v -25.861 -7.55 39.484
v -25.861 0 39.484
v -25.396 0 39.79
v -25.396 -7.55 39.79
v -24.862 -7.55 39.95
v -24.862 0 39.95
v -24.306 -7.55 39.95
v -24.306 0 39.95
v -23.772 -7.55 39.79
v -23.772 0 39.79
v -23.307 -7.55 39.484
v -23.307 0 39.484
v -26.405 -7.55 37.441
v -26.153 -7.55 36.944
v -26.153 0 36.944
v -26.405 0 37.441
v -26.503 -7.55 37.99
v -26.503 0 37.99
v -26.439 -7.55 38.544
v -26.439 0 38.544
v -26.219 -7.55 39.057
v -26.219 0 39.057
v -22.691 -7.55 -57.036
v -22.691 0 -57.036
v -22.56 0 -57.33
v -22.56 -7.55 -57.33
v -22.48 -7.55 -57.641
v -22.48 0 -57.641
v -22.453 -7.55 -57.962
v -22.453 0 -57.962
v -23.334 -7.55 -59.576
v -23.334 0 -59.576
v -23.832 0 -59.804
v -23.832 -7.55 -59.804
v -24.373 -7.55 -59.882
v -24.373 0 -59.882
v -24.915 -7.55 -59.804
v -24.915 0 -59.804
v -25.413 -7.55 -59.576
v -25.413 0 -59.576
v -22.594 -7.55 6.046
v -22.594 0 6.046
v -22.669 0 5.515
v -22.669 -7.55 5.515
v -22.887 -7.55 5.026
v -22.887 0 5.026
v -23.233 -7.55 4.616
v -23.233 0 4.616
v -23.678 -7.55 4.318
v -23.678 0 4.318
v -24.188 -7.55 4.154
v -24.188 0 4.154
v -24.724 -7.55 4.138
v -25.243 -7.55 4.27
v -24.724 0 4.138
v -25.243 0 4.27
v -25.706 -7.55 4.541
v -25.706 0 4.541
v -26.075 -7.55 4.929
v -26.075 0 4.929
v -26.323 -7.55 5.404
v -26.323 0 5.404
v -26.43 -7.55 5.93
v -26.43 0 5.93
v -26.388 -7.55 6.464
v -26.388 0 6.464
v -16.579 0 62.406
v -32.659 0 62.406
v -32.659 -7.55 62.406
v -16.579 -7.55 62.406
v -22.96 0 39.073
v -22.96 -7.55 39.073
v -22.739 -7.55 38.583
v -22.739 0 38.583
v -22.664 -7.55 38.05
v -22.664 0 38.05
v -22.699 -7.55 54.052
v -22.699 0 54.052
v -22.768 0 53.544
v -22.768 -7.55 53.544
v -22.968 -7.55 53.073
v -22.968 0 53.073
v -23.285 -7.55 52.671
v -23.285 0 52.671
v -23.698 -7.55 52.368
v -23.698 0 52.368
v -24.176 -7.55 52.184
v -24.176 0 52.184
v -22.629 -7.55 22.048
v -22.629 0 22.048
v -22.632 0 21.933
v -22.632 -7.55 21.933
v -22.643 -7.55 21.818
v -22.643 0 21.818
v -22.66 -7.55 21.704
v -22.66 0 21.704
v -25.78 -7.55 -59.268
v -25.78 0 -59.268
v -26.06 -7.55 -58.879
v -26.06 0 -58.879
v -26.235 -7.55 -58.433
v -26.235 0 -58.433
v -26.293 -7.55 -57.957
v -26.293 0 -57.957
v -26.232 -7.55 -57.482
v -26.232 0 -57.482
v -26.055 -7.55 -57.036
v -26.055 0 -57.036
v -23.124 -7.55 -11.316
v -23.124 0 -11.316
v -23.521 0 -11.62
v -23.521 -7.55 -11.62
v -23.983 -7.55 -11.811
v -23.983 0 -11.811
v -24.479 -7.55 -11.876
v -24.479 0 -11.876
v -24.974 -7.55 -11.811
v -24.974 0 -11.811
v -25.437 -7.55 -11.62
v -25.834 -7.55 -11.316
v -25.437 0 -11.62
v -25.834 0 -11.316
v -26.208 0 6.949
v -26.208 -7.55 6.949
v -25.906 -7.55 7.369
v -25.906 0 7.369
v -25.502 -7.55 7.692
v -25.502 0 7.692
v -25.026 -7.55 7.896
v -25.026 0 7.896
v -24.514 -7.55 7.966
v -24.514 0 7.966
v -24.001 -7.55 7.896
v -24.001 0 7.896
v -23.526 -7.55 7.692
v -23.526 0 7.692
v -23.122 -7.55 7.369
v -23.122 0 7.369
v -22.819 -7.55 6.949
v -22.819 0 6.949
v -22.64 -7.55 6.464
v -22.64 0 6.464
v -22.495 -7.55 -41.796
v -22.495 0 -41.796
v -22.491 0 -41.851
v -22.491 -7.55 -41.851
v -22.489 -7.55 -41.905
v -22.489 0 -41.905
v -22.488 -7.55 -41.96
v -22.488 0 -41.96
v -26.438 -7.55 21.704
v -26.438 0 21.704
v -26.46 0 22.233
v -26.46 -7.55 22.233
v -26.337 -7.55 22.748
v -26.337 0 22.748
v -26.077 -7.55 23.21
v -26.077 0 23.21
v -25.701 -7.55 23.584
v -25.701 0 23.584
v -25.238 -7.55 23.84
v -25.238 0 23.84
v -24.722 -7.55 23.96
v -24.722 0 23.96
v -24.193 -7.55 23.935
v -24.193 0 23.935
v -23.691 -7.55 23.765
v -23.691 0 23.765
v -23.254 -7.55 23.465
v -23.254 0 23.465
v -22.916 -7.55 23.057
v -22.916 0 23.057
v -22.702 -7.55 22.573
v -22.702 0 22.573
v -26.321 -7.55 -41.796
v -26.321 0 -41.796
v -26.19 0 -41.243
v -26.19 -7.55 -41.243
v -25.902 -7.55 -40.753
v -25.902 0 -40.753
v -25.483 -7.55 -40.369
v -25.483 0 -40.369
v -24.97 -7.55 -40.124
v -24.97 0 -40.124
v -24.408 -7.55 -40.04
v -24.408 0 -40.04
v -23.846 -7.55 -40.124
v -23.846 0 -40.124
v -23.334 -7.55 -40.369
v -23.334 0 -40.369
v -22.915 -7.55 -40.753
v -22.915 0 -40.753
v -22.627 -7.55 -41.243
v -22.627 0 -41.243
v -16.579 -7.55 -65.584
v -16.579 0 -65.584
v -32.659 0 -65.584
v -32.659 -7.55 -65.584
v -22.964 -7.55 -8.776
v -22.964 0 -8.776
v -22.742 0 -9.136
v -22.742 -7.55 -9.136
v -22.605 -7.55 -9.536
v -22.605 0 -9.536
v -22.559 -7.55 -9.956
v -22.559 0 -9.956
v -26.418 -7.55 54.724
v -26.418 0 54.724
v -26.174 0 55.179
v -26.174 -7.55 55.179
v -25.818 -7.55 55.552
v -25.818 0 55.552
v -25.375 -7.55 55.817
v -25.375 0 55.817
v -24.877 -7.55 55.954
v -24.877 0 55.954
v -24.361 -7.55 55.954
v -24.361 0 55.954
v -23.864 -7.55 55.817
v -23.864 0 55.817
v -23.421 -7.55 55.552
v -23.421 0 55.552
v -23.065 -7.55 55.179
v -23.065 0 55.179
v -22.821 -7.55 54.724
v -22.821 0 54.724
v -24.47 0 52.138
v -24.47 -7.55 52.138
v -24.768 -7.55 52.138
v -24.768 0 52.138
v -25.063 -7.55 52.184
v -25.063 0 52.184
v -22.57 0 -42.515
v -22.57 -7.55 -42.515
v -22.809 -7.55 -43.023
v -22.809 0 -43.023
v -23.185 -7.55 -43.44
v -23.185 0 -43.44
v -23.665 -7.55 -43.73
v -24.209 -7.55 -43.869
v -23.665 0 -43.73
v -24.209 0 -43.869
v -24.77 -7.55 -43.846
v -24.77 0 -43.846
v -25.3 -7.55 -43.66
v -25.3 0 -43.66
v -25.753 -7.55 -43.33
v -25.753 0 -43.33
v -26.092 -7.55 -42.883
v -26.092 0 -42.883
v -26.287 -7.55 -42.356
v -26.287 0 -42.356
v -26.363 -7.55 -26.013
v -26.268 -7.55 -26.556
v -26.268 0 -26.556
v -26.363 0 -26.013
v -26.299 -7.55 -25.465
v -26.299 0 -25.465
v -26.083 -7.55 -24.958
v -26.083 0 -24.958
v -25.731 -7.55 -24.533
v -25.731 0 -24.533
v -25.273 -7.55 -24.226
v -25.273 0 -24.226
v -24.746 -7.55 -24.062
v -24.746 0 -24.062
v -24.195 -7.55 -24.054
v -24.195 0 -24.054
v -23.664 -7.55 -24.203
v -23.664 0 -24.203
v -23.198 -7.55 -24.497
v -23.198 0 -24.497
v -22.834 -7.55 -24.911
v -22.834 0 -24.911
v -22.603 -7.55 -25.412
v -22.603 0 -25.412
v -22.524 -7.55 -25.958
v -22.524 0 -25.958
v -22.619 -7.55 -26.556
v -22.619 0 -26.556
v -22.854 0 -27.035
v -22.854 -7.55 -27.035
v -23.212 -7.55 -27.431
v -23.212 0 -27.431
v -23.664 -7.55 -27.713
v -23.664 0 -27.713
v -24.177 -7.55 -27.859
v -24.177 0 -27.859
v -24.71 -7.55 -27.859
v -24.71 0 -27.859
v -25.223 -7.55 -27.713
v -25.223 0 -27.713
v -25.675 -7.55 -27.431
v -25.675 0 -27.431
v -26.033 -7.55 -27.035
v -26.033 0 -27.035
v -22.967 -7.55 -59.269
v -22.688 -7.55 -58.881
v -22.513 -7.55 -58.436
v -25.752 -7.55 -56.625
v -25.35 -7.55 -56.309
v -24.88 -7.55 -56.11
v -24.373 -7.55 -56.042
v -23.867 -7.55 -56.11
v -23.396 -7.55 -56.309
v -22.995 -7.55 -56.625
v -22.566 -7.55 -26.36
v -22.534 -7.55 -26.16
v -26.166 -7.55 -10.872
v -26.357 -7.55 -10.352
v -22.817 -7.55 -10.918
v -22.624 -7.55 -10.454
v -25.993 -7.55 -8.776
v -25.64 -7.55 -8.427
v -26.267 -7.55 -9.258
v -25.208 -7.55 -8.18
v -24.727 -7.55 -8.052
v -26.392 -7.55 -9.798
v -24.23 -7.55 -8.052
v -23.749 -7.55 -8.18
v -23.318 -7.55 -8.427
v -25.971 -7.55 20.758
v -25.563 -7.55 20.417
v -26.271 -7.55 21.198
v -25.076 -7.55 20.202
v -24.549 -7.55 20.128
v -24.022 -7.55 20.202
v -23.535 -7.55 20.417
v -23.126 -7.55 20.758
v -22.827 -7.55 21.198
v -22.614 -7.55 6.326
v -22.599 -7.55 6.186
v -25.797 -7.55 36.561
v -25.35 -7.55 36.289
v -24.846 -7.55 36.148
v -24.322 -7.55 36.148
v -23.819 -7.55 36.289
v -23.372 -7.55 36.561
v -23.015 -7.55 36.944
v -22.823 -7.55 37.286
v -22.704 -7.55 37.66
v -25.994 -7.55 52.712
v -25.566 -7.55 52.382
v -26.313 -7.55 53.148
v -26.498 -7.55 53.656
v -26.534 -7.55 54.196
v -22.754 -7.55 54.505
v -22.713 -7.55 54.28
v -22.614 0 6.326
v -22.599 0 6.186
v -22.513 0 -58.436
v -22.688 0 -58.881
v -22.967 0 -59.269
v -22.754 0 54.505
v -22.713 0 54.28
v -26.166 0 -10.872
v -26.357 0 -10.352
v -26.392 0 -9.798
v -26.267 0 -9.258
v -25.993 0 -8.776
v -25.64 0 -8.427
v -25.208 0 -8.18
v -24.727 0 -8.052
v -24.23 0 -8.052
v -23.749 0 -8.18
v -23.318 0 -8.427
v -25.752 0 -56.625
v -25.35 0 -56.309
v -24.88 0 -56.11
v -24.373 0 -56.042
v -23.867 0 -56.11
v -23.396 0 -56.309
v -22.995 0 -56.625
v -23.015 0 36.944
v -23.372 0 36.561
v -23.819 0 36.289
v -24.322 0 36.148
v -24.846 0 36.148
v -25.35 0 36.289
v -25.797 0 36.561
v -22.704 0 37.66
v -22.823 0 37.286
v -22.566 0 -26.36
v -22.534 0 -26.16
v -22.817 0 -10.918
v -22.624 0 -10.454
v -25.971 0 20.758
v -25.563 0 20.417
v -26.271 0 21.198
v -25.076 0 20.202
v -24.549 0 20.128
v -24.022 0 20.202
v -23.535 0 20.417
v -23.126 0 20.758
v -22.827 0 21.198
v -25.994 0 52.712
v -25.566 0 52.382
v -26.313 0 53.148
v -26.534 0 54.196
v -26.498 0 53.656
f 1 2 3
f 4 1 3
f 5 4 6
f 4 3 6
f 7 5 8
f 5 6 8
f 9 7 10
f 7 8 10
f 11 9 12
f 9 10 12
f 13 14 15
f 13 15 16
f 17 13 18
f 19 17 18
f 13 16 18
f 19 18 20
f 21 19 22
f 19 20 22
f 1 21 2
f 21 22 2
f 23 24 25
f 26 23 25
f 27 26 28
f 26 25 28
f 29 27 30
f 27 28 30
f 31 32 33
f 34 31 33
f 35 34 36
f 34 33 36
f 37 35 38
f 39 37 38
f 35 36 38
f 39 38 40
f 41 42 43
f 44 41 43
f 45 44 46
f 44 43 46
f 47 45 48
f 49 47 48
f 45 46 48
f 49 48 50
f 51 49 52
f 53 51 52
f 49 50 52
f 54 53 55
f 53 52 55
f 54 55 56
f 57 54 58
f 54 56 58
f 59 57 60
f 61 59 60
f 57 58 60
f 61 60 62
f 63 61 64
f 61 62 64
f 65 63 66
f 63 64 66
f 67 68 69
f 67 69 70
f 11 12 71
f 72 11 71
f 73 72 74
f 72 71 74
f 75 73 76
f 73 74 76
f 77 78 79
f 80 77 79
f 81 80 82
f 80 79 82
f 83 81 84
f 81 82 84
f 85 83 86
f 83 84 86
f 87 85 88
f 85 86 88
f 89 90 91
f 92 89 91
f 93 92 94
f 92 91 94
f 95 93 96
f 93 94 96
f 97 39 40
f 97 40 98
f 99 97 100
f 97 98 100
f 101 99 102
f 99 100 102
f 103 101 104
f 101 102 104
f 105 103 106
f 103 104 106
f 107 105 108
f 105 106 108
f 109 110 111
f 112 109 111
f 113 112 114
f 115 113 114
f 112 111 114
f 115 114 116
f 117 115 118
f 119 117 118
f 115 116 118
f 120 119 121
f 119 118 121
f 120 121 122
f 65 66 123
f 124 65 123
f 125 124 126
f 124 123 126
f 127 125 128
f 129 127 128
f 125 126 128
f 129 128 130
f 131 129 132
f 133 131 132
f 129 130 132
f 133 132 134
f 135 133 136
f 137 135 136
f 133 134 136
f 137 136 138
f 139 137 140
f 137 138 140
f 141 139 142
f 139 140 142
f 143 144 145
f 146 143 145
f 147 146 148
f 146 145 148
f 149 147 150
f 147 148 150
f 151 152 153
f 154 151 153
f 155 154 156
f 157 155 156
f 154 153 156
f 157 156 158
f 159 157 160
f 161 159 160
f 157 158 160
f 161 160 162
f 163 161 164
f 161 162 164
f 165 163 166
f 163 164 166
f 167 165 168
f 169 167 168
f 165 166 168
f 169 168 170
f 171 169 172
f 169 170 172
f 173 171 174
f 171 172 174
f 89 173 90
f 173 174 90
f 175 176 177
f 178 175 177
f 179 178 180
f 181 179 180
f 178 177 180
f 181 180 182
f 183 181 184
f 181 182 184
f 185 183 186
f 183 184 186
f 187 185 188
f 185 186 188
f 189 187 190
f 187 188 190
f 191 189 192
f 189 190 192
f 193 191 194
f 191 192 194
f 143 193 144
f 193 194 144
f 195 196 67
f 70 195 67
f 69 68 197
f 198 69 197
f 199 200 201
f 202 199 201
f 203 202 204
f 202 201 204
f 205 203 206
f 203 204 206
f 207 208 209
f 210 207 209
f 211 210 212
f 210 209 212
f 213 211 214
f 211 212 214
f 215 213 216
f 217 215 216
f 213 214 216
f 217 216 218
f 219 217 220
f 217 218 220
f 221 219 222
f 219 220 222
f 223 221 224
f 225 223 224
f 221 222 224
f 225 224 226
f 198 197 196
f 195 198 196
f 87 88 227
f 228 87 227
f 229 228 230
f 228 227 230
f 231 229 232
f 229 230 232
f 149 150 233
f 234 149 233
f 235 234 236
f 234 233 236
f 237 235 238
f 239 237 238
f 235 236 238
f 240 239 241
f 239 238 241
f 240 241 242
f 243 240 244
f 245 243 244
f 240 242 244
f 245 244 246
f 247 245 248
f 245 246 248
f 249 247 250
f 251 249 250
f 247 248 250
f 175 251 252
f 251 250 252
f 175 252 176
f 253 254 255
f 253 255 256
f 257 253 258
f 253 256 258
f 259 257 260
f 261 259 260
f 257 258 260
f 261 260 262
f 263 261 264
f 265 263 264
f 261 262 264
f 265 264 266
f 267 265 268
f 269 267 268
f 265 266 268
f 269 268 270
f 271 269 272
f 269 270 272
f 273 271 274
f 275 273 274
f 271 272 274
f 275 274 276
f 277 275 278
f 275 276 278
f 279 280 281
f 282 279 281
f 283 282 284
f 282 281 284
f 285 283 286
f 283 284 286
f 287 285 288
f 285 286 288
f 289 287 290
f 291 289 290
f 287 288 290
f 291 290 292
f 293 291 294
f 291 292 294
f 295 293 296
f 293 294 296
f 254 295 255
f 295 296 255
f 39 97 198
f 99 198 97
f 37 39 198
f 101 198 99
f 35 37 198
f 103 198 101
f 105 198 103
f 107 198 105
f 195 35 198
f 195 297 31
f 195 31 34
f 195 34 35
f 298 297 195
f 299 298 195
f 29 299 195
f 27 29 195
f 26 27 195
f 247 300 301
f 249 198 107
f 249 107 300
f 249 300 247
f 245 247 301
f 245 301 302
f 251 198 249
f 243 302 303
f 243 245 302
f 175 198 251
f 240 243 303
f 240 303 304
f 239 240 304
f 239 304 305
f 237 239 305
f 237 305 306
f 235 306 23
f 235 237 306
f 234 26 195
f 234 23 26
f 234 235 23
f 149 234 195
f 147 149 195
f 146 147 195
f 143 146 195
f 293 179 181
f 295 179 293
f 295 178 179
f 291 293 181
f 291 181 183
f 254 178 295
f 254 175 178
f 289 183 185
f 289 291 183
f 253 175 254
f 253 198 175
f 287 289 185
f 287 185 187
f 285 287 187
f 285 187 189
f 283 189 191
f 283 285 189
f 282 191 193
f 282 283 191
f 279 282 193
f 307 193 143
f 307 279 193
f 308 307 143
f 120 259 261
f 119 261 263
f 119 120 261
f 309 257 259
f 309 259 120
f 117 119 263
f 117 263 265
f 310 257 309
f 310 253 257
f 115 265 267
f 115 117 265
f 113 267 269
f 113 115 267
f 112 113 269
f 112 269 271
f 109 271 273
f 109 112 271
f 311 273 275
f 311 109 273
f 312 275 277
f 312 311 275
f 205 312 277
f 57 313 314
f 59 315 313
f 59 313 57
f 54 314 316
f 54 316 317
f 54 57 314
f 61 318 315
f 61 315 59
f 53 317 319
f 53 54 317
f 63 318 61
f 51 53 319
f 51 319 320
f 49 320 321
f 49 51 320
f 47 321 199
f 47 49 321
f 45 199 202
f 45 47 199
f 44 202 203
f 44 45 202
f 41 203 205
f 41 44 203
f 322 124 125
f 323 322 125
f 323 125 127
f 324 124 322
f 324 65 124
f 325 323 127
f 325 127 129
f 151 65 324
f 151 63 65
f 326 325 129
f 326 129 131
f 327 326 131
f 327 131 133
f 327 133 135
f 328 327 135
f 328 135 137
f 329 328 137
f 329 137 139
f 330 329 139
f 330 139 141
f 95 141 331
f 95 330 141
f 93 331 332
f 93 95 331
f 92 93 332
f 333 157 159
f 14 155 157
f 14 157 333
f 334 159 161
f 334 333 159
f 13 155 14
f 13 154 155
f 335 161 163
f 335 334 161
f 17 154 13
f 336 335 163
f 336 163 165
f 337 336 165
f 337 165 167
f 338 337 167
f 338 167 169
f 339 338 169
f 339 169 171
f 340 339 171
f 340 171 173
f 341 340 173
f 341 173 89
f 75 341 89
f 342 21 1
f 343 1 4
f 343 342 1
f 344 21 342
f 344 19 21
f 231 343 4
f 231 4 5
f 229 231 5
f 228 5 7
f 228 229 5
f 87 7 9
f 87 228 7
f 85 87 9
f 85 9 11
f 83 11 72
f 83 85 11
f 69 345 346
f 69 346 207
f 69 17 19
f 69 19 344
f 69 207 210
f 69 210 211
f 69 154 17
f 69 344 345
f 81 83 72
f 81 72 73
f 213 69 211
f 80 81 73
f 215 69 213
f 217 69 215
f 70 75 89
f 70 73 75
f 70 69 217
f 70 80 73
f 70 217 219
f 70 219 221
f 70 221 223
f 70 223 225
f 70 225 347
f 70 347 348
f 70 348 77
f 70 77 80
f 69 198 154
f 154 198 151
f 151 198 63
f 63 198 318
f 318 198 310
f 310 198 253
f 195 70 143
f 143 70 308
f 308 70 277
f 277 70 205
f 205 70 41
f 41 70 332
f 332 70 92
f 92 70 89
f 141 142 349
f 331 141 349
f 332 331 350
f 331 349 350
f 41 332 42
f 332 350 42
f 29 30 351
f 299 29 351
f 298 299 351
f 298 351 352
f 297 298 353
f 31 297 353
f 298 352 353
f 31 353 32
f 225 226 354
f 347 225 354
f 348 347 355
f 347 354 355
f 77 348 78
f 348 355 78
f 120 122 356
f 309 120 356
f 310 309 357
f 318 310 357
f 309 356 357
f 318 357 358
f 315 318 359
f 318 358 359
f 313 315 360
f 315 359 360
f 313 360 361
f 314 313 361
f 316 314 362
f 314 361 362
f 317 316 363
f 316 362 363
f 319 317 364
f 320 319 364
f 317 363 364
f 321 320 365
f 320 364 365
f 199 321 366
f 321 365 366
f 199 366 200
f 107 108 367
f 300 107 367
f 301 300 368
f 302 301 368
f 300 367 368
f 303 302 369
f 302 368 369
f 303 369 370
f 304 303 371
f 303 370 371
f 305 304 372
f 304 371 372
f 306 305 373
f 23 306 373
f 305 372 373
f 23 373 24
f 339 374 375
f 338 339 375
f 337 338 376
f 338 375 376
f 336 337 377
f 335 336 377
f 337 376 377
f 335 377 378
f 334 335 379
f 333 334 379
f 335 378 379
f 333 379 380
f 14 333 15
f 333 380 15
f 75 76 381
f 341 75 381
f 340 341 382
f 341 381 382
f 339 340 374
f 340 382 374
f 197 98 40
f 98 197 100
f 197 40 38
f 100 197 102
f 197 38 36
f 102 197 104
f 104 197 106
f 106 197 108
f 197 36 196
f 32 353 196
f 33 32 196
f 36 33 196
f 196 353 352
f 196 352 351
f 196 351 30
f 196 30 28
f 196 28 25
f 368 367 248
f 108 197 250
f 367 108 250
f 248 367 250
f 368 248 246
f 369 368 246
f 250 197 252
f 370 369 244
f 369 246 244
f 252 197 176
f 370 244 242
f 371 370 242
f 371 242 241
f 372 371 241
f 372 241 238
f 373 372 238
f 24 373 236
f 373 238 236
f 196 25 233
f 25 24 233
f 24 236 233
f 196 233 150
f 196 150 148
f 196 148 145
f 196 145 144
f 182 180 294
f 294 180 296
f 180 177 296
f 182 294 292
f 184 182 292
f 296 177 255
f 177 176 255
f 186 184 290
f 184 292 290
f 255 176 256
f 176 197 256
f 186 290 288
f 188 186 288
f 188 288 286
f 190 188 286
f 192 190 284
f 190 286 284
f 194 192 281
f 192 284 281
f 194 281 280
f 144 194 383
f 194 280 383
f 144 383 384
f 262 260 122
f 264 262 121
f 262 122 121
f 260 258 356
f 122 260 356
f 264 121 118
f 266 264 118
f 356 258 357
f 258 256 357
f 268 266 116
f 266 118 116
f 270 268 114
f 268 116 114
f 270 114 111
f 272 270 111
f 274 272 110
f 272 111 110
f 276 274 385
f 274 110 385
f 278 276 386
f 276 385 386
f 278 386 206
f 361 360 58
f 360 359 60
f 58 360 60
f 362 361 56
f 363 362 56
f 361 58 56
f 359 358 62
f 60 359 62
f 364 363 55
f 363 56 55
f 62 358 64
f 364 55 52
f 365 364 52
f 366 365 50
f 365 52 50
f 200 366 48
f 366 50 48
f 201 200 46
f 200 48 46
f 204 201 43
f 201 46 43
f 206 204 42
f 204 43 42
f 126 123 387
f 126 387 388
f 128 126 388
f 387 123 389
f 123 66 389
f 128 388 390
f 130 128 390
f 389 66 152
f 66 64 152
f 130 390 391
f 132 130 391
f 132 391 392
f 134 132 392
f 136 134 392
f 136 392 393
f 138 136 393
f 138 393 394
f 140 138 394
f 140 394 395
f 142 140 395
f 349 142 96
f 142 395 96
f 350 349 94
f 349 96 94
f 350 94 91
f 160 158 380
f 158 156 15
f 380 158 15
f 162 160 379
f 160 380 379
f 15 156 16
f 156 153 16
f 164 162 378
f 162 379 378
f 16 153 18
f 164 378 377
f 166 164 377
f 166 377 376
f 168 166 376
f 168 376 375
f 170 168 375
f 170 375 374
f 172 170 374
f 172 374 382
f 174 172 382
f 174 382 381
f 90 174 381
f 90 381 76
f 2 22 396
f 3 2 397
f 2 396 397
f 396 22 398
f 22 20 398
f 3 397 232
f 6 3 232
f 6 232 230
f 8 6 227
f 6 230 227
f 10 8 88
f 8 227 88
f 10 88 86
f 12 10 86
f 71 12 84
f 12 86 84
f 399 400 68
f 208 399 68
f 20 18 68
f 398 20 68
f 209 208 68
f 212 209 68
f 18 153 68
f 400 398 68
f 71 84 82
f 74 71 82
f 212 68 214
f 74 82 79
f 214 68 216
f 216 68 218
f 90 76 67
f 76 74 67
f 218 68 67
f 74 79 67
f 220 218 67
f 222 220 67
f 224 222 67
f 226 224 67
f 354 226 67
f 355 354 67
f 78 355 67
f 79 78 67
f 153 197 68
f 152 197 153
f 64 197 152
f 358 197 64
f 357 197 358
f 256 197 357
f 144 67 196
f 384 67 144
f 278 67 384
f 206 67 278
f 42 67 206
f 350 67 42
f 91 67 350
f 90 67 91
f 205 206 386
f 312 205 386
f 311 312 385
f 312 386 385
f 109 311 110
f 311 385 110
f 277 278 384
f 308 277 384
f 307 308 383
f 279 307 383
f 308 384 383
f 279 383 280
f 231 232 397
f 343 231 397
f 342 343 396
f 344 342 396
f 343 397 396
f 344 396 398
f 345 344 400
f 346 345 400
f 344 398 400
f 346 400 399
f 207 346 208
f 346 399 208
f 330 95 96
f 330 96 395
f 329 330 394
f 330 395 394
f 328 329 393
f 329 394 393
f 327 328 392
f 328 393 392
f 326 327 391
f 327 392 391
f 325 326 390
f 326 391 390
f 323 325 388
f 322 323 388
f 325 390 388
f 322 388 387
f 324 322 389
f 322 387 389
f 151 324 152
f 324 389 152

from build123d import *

# Parameters (mm, degrees)
F0_W     = 16.08
F0_H     = 2.6018508029
F1_DEPTH = 7.55


# Not quite as in the source:
# - the program builds the solid bodies; features that only make, move or delete a surface that nothing else refers to are left out


with BuildPart() as f1:
    # F0 (on Front) → F1 (new body)
    with BuildSketch(Plane.XZ):
        with Locations((-24.6192478486, 61.1047763503)):
            Rectangle(F0_W, F0_H)
        with BuildLine():
            Line((-16.5792478486, 59.8038509488), (-32.6592478486, 59.8038509488))
            Line((-32.6592478486, 59.8038509488), (-32.6592478486, 57.2638509407))
            Line((-32.6592478486, 57.2638509407), (-32.6592478486, 54.7238509326))
            Line((-32.6592478486, 54.7238509326), (-26.4178277978, 54.7238509326))
            ThreePointArc((-26.4178277978, 54.7238509326), (-24.6192478486, 55.9719058704), (-22.8206678995, 54.7238509326))
            ThreePointArc((-22.8206678995, 54.7238509326), (-22.7298466866, 54.3933194742), (-22.6992478486, 54.0519058704))
            ThreePointArc((-22.6992478486, 54.0519058704), (-23.1129129196, 52.8613786421), (-24.1756593919, 52.1838509245))
            ThreePointArc((-24.1756593919, 52.1838509245), (-24.6192478486, 52.1319058704), (-25.0628363054, 52.1838509245))
            Line((-25.0628363054, 52.1838509245), (-32.6592478486, 52.1838509245))
            Line((-32.6592478486, 52.1838509245), (-32.6592478486, 49.6438509164))
            Line((-32.6592478486, 49.6438509164), (-32.6592478486, 47.1038509083))
            Line((-32.6592478486, 47.1038509083), (-32.6592478486, 44.5638509002))
            Line((-32.6592478486, 44.5638509002), (-32.6592478486, 42.0238508921))
            Line((-32.6592478486, 42.0238508921), (-32.6592478486, 39.483850884))
            Line((-32.6592478486, 39.483850884), (-25.86093695, 39.483850884))
            ThreePointArc((-25.86093695, 39.483850884), (-24.5840999414, 39.9699445923), (-23.3072629328, 39.483850884))
            ThreePointArc((-23.3072629328, 39.483850884), (-22.8322541924, 38.8357158514), (-22.6640999414, 38.0499445923))
            ThreePointArc((-22.6640999414, 38.0499445923), (-22.7538524855, 37.4697771596), (-23.0147189518, 36.9438508759))
            ThreePointArc((-23.0147189518, 36.9438508759), (-24.5840999414, 36.1299445923), (-26.1534809311, 36.9438508759))
            Line((-26.1534809311, 36.9438508759), (-32.6592478486, 36.9438508759))
            Line((-32.6592478486, 36.9438508759), (-32.6592478486, 34.4038508678))
            Line((-32.6592478486, 34.4038508678), (-32.6592478486, 31.8638508597))
            Line((-32.6592478486, 31.8638508597), (-32.6592478486, 29.3238508516))
            Line((-32.6592478486, 29.3238508516), (-32.6592478486, 26.7838508435))
            Line((-32.6592478486, 26.7838508435), (-32.6592478486, 24.2438508354))
            Line((-32.6592478486, 24.2438508354), (-32.6592478486, 21.7038508273))
            Line((-32.6592478486, 21.7038508273), (-32.6592478486, 19.1638508192))
            Line((-32.6592478486, 19.1638508192), (-32.6592478486, 16.623850811))
            Line((-32.6592478486, 16.623850811), (-32.6592478486, 14.0838508029))
            Line((-32.6592478486, 14.0838508029), (-32.6592478486, 11.5438507948))
            Line((-32.6592478486, 11.5438507948), (-32.6592478486, 9.0038507867))
            Line((-32.6592478486, 9.0038507867), (-32.6592478486, 6.4638507786))
            Line((-32.6592478486, 6.4638507786), (-32.6592478486, 3.9238507705))
            Line((-32.6592478486, 3.9238507705), (-32.6592478486, 1.3838507624))
            Line((-32.6592478486, 1.3838507624), (-32.6592478486, -1.1561492457))
            Line((-32.6592478486, -1.1561492457), (-32.6592478486, -3.6961492538))
            Line((-32.6592478486, -3.6961492538), (-32.6592478486, -6.2361492619))
            Line((-32.6592478486, -6.2361492619), (-32.6592478486, -8.77614927))
            Line((-32.6592478486, -8.77614927), (-25.9934154817, -8.77614927))
            ThreePointArc((-25.9934154817, -8.77614927), (-24.4786562199, -8.0359392423), (-22.9638969581, -8.77614927))
            ThreePointArc((-22.9638969581, -8.77614927), (-22.6627903407, -9.3322156588), (-22.5586562199, -9.9559392423))
            ThreePointArc((-22.5586562199, -9.9559392423), (-22.705503056, -10.6923683681), (-23.1235810713, -11.3161492781))
            ThreePointArc((-23.1235810713, -11.3161492781), (-24.4786562199, -11.8759392423), (-25.8337313686, -11.3161492781))
            Line((-25.8337313686, -11.3161492781), (-32.6592478486, -11.3161492781))
            Line((-32.6592478486, -11.3161492781), (-32.6592478486, -13.8561492862))
            Line((-32.6592478486, -13.8561492862), (-32.6592478486, -16.3961492943))
            Line((-32.6592478486, -16.3961492943), (-32.6592478486, -18.9361493024))
            Line((-32.6592478486, -18.9361493024), (-32.6592478486, -21.4761493105))
            Line((-32.6592478486, -21.4761493105), (-32.6592478486, -24.0161493186))
            Line((-32.6592478486, -24.0161493186), (-32.6592478486, -26.5561493267))
            Line((-32.6592478486, -26.5561493267), (-32.6592478486, -29.0961493348))
            Line((-32.6592478486, -29.0961493348), (-32.6592478486, -31.6361493429))
            Line((-32.6592478486, -31.6361493429), (-32.6592478486, -34.176149351))
            Line((-32.6592478486, -34.176149351), (-32.6592478486, -36.7161493591))
            Line((-32.6592478486, -36.7161493591), (-32.6592478486, -39.2561493672))
            Line((-32.6592478486, -39.2561493672), (-32.6592478486, -41.7961493753))
            Line((-32.6592478486, -41.7961493753), (-32.6592478486, -44.3361493834))
            Line((-32.6592478486, -44.3361493834), (-32.6592478486, -46.8761493915))
            Line((-32.6592478486, -46.8761493915), (-32.6592478486, -49.4161493996))
            Line((-32.6592478486, -49.4161493996), (-32.6592478486, -51.9561494077))
            Line((-32.6592478486, -51.9561494077), (-32.6592478486, -54.4961494159))
            Line((-32.6592478486, -54.4961494159), (-32.6592478486, -57.036149424))
            Line((-32.6592478486, -57.036149424), (-26.0553326749, -57.036149424))
            ThreePointArc((-26.0553326749, -57.036149424), (-24.3732124984, -56.0418230768), (-22.6910923218, -57.036149424))
            ThreePointArc((-22.6910923218, -57.036149424), (-22.5136331455, -57.4839479566), (-22.4532124984, -57.9618230768))
            ThreePointArc((-22.4532124984, -57.9618230768), (-22.6876790209, -58.8812668742), (-23.3338134322, -59.5761494321))
            ThreePointArc((-23.3338134322, -59.5761494321), (-24.3732124984, -59.8818230768), (-25.4126115646, -59.5761494321))
            Line((-25.4126115646, -59.5761494321), (-32.6592478486, -59.5761494321))
            Line((-32.6592478486, -59.5761494321), (-32.6592478486, -62.1161494402))
            Line((-32.6592478486, -62.1161494402), (-32.6592478486, -65.5842982483))
            Line((-32.6592478486, -65.5842982483), (-16.5792478486, -65.5842982483))
            Line((-16.5792478486, -65.5842982483), (-16.5792478486, 59.8038509488))
        make_face()
        with BuildLine():
            ThreePointArc((-22.4883604056, -41.9598617986), (-24.4902912462, -43.8781129129), (-26.3213680486, -41.7961493753))
            ThreePointArc((-26.3213680486, -41.7961493753), (-24.4083604056, -40.0398617986), (-22.4953527625, -41.7961493753))
            ThreePointArc((-22.4953527625, -41.7961493753), (-22.4901092913, -41.877930958), (-22.4883604056, -41.9598617986))
        make_face(mode=Mode.SUBTRACT)
        with BuildLine():
            ThreePointArc((-22.6190910453, -26.5561493267), (-24.4435083127, -27.8779005205), (-26.2679255802, -26.5561493267))
            ThreePointArc((-26.2679255802, -26.5561493267), (-24.7464264918, -24.0619467824), (-22.5235083127, -25.9579005205))
            ThreePointArc((-22.5235083127, -25.9579005205), (-22.5475545747, -26.2608186996), (-22.6190910453, -26.5561493267))
        make_face(mode=Mode.SUBTRACT)
        with BuildLine():
            ThreePointArc((-22.5938041271, 6.0460220359), (-24.7239815843, 4.1375604994), (-26.3877889567, 6.4638507786))
            ThreePointArc((-26.3877889567, 6.4638507786), (-24.5138041271, 7.9660220359), (-22.6398192974, 6.4638507786))
            ThreePointArc((-22.6398192974, 6.4638507786), (-22.6053425905, 6.2561994932), (-22.5938041271, 6.0460220359))
        make_face(mode=Mode.SUBTRACT)
        with BuildLine():
            ThreePointArc((-22.6600441933, 21.7038508273), (-24.5489520343, 20.1279833141), (-26.4378598752, 21.7038508273))
            ThreePointArc((-26.4378598752, 21.7038508273), (-24.7217191397, 23.9601944759), (-22.6289520343, 22.0479833141))
            ThreePointArc((-22.6289520343, 22.0479833141), (-22.6367408725, 21.8752162087), (-22.6600441933, 21.7038508273))
        make_face(mode=Mode.SUBTRACT)
        with BuildLine():
            Line((-26.4178277978, 54.7238509326), (-32.6592478486, 54.7238509326))
            Line((-32.6592478486, 54.7238509326), (-32.6592478486, 52.1838509245))
            Line((-32.6592478486, 52.1838509245), (-25.0628363054, 52.1838509245))
            ThreePointArc((-25.0628363054, 52.1838509245), (-26.3132755345, 53.1482078016), (-26.4178277978, 54.7238509326))
        make_face()
        with BuildLine():
            Line((-32.6592478486, -57.036149424), (-32.6592478486, -59.5761494321))
            Line((-32.6592478486, -59.5761494321), (-25.4126115646, -59.5761494321))
            ThreePointArc((-25.4126115646, -59.5761494321), (-26.2345471694, -58.4328148417), (-26.0553326749, -57.036149424))
            Line((-26.0553326749, -57.036149424), (-32.6592478486, -57.036149424))
        make_face()
        with BuildLine():
            Line((-25.86093695, 39.483850884), (-32.6592478486, 39.483850884))
            Line((-32.6592478486, 39.483850884), (-32.6592478486, 36.9438508759))
            Line((-32.6592478486, 36.9438508759), (-26.1534809311, 36.9438508759))
            ThreePointArc((-26.1534809311, 36.9438508759), (-26.4914906287, 38.2696279242), (-25.86093695, 39.483850884))
        make_face()
        with BuildLine():
            Line((-32.6592478486, -8.77614927), (-32.6592478486, -11.3161492781))
            Line((-32.6592478486, -11.3161492781), (-25.8337313686, -11.3161492781))
            ThreePointArc((-25.8337313686, -11.3161492781), (-26.394873169, -10.0764075113), (-25.9934154817, -8.77614927))
            Line((-25.9934154817, -8.77614927), (-32.6592478486, -8.77614927))
        make_face()
    extrude(amount=F1_DEPTH)


solid = f1.part
